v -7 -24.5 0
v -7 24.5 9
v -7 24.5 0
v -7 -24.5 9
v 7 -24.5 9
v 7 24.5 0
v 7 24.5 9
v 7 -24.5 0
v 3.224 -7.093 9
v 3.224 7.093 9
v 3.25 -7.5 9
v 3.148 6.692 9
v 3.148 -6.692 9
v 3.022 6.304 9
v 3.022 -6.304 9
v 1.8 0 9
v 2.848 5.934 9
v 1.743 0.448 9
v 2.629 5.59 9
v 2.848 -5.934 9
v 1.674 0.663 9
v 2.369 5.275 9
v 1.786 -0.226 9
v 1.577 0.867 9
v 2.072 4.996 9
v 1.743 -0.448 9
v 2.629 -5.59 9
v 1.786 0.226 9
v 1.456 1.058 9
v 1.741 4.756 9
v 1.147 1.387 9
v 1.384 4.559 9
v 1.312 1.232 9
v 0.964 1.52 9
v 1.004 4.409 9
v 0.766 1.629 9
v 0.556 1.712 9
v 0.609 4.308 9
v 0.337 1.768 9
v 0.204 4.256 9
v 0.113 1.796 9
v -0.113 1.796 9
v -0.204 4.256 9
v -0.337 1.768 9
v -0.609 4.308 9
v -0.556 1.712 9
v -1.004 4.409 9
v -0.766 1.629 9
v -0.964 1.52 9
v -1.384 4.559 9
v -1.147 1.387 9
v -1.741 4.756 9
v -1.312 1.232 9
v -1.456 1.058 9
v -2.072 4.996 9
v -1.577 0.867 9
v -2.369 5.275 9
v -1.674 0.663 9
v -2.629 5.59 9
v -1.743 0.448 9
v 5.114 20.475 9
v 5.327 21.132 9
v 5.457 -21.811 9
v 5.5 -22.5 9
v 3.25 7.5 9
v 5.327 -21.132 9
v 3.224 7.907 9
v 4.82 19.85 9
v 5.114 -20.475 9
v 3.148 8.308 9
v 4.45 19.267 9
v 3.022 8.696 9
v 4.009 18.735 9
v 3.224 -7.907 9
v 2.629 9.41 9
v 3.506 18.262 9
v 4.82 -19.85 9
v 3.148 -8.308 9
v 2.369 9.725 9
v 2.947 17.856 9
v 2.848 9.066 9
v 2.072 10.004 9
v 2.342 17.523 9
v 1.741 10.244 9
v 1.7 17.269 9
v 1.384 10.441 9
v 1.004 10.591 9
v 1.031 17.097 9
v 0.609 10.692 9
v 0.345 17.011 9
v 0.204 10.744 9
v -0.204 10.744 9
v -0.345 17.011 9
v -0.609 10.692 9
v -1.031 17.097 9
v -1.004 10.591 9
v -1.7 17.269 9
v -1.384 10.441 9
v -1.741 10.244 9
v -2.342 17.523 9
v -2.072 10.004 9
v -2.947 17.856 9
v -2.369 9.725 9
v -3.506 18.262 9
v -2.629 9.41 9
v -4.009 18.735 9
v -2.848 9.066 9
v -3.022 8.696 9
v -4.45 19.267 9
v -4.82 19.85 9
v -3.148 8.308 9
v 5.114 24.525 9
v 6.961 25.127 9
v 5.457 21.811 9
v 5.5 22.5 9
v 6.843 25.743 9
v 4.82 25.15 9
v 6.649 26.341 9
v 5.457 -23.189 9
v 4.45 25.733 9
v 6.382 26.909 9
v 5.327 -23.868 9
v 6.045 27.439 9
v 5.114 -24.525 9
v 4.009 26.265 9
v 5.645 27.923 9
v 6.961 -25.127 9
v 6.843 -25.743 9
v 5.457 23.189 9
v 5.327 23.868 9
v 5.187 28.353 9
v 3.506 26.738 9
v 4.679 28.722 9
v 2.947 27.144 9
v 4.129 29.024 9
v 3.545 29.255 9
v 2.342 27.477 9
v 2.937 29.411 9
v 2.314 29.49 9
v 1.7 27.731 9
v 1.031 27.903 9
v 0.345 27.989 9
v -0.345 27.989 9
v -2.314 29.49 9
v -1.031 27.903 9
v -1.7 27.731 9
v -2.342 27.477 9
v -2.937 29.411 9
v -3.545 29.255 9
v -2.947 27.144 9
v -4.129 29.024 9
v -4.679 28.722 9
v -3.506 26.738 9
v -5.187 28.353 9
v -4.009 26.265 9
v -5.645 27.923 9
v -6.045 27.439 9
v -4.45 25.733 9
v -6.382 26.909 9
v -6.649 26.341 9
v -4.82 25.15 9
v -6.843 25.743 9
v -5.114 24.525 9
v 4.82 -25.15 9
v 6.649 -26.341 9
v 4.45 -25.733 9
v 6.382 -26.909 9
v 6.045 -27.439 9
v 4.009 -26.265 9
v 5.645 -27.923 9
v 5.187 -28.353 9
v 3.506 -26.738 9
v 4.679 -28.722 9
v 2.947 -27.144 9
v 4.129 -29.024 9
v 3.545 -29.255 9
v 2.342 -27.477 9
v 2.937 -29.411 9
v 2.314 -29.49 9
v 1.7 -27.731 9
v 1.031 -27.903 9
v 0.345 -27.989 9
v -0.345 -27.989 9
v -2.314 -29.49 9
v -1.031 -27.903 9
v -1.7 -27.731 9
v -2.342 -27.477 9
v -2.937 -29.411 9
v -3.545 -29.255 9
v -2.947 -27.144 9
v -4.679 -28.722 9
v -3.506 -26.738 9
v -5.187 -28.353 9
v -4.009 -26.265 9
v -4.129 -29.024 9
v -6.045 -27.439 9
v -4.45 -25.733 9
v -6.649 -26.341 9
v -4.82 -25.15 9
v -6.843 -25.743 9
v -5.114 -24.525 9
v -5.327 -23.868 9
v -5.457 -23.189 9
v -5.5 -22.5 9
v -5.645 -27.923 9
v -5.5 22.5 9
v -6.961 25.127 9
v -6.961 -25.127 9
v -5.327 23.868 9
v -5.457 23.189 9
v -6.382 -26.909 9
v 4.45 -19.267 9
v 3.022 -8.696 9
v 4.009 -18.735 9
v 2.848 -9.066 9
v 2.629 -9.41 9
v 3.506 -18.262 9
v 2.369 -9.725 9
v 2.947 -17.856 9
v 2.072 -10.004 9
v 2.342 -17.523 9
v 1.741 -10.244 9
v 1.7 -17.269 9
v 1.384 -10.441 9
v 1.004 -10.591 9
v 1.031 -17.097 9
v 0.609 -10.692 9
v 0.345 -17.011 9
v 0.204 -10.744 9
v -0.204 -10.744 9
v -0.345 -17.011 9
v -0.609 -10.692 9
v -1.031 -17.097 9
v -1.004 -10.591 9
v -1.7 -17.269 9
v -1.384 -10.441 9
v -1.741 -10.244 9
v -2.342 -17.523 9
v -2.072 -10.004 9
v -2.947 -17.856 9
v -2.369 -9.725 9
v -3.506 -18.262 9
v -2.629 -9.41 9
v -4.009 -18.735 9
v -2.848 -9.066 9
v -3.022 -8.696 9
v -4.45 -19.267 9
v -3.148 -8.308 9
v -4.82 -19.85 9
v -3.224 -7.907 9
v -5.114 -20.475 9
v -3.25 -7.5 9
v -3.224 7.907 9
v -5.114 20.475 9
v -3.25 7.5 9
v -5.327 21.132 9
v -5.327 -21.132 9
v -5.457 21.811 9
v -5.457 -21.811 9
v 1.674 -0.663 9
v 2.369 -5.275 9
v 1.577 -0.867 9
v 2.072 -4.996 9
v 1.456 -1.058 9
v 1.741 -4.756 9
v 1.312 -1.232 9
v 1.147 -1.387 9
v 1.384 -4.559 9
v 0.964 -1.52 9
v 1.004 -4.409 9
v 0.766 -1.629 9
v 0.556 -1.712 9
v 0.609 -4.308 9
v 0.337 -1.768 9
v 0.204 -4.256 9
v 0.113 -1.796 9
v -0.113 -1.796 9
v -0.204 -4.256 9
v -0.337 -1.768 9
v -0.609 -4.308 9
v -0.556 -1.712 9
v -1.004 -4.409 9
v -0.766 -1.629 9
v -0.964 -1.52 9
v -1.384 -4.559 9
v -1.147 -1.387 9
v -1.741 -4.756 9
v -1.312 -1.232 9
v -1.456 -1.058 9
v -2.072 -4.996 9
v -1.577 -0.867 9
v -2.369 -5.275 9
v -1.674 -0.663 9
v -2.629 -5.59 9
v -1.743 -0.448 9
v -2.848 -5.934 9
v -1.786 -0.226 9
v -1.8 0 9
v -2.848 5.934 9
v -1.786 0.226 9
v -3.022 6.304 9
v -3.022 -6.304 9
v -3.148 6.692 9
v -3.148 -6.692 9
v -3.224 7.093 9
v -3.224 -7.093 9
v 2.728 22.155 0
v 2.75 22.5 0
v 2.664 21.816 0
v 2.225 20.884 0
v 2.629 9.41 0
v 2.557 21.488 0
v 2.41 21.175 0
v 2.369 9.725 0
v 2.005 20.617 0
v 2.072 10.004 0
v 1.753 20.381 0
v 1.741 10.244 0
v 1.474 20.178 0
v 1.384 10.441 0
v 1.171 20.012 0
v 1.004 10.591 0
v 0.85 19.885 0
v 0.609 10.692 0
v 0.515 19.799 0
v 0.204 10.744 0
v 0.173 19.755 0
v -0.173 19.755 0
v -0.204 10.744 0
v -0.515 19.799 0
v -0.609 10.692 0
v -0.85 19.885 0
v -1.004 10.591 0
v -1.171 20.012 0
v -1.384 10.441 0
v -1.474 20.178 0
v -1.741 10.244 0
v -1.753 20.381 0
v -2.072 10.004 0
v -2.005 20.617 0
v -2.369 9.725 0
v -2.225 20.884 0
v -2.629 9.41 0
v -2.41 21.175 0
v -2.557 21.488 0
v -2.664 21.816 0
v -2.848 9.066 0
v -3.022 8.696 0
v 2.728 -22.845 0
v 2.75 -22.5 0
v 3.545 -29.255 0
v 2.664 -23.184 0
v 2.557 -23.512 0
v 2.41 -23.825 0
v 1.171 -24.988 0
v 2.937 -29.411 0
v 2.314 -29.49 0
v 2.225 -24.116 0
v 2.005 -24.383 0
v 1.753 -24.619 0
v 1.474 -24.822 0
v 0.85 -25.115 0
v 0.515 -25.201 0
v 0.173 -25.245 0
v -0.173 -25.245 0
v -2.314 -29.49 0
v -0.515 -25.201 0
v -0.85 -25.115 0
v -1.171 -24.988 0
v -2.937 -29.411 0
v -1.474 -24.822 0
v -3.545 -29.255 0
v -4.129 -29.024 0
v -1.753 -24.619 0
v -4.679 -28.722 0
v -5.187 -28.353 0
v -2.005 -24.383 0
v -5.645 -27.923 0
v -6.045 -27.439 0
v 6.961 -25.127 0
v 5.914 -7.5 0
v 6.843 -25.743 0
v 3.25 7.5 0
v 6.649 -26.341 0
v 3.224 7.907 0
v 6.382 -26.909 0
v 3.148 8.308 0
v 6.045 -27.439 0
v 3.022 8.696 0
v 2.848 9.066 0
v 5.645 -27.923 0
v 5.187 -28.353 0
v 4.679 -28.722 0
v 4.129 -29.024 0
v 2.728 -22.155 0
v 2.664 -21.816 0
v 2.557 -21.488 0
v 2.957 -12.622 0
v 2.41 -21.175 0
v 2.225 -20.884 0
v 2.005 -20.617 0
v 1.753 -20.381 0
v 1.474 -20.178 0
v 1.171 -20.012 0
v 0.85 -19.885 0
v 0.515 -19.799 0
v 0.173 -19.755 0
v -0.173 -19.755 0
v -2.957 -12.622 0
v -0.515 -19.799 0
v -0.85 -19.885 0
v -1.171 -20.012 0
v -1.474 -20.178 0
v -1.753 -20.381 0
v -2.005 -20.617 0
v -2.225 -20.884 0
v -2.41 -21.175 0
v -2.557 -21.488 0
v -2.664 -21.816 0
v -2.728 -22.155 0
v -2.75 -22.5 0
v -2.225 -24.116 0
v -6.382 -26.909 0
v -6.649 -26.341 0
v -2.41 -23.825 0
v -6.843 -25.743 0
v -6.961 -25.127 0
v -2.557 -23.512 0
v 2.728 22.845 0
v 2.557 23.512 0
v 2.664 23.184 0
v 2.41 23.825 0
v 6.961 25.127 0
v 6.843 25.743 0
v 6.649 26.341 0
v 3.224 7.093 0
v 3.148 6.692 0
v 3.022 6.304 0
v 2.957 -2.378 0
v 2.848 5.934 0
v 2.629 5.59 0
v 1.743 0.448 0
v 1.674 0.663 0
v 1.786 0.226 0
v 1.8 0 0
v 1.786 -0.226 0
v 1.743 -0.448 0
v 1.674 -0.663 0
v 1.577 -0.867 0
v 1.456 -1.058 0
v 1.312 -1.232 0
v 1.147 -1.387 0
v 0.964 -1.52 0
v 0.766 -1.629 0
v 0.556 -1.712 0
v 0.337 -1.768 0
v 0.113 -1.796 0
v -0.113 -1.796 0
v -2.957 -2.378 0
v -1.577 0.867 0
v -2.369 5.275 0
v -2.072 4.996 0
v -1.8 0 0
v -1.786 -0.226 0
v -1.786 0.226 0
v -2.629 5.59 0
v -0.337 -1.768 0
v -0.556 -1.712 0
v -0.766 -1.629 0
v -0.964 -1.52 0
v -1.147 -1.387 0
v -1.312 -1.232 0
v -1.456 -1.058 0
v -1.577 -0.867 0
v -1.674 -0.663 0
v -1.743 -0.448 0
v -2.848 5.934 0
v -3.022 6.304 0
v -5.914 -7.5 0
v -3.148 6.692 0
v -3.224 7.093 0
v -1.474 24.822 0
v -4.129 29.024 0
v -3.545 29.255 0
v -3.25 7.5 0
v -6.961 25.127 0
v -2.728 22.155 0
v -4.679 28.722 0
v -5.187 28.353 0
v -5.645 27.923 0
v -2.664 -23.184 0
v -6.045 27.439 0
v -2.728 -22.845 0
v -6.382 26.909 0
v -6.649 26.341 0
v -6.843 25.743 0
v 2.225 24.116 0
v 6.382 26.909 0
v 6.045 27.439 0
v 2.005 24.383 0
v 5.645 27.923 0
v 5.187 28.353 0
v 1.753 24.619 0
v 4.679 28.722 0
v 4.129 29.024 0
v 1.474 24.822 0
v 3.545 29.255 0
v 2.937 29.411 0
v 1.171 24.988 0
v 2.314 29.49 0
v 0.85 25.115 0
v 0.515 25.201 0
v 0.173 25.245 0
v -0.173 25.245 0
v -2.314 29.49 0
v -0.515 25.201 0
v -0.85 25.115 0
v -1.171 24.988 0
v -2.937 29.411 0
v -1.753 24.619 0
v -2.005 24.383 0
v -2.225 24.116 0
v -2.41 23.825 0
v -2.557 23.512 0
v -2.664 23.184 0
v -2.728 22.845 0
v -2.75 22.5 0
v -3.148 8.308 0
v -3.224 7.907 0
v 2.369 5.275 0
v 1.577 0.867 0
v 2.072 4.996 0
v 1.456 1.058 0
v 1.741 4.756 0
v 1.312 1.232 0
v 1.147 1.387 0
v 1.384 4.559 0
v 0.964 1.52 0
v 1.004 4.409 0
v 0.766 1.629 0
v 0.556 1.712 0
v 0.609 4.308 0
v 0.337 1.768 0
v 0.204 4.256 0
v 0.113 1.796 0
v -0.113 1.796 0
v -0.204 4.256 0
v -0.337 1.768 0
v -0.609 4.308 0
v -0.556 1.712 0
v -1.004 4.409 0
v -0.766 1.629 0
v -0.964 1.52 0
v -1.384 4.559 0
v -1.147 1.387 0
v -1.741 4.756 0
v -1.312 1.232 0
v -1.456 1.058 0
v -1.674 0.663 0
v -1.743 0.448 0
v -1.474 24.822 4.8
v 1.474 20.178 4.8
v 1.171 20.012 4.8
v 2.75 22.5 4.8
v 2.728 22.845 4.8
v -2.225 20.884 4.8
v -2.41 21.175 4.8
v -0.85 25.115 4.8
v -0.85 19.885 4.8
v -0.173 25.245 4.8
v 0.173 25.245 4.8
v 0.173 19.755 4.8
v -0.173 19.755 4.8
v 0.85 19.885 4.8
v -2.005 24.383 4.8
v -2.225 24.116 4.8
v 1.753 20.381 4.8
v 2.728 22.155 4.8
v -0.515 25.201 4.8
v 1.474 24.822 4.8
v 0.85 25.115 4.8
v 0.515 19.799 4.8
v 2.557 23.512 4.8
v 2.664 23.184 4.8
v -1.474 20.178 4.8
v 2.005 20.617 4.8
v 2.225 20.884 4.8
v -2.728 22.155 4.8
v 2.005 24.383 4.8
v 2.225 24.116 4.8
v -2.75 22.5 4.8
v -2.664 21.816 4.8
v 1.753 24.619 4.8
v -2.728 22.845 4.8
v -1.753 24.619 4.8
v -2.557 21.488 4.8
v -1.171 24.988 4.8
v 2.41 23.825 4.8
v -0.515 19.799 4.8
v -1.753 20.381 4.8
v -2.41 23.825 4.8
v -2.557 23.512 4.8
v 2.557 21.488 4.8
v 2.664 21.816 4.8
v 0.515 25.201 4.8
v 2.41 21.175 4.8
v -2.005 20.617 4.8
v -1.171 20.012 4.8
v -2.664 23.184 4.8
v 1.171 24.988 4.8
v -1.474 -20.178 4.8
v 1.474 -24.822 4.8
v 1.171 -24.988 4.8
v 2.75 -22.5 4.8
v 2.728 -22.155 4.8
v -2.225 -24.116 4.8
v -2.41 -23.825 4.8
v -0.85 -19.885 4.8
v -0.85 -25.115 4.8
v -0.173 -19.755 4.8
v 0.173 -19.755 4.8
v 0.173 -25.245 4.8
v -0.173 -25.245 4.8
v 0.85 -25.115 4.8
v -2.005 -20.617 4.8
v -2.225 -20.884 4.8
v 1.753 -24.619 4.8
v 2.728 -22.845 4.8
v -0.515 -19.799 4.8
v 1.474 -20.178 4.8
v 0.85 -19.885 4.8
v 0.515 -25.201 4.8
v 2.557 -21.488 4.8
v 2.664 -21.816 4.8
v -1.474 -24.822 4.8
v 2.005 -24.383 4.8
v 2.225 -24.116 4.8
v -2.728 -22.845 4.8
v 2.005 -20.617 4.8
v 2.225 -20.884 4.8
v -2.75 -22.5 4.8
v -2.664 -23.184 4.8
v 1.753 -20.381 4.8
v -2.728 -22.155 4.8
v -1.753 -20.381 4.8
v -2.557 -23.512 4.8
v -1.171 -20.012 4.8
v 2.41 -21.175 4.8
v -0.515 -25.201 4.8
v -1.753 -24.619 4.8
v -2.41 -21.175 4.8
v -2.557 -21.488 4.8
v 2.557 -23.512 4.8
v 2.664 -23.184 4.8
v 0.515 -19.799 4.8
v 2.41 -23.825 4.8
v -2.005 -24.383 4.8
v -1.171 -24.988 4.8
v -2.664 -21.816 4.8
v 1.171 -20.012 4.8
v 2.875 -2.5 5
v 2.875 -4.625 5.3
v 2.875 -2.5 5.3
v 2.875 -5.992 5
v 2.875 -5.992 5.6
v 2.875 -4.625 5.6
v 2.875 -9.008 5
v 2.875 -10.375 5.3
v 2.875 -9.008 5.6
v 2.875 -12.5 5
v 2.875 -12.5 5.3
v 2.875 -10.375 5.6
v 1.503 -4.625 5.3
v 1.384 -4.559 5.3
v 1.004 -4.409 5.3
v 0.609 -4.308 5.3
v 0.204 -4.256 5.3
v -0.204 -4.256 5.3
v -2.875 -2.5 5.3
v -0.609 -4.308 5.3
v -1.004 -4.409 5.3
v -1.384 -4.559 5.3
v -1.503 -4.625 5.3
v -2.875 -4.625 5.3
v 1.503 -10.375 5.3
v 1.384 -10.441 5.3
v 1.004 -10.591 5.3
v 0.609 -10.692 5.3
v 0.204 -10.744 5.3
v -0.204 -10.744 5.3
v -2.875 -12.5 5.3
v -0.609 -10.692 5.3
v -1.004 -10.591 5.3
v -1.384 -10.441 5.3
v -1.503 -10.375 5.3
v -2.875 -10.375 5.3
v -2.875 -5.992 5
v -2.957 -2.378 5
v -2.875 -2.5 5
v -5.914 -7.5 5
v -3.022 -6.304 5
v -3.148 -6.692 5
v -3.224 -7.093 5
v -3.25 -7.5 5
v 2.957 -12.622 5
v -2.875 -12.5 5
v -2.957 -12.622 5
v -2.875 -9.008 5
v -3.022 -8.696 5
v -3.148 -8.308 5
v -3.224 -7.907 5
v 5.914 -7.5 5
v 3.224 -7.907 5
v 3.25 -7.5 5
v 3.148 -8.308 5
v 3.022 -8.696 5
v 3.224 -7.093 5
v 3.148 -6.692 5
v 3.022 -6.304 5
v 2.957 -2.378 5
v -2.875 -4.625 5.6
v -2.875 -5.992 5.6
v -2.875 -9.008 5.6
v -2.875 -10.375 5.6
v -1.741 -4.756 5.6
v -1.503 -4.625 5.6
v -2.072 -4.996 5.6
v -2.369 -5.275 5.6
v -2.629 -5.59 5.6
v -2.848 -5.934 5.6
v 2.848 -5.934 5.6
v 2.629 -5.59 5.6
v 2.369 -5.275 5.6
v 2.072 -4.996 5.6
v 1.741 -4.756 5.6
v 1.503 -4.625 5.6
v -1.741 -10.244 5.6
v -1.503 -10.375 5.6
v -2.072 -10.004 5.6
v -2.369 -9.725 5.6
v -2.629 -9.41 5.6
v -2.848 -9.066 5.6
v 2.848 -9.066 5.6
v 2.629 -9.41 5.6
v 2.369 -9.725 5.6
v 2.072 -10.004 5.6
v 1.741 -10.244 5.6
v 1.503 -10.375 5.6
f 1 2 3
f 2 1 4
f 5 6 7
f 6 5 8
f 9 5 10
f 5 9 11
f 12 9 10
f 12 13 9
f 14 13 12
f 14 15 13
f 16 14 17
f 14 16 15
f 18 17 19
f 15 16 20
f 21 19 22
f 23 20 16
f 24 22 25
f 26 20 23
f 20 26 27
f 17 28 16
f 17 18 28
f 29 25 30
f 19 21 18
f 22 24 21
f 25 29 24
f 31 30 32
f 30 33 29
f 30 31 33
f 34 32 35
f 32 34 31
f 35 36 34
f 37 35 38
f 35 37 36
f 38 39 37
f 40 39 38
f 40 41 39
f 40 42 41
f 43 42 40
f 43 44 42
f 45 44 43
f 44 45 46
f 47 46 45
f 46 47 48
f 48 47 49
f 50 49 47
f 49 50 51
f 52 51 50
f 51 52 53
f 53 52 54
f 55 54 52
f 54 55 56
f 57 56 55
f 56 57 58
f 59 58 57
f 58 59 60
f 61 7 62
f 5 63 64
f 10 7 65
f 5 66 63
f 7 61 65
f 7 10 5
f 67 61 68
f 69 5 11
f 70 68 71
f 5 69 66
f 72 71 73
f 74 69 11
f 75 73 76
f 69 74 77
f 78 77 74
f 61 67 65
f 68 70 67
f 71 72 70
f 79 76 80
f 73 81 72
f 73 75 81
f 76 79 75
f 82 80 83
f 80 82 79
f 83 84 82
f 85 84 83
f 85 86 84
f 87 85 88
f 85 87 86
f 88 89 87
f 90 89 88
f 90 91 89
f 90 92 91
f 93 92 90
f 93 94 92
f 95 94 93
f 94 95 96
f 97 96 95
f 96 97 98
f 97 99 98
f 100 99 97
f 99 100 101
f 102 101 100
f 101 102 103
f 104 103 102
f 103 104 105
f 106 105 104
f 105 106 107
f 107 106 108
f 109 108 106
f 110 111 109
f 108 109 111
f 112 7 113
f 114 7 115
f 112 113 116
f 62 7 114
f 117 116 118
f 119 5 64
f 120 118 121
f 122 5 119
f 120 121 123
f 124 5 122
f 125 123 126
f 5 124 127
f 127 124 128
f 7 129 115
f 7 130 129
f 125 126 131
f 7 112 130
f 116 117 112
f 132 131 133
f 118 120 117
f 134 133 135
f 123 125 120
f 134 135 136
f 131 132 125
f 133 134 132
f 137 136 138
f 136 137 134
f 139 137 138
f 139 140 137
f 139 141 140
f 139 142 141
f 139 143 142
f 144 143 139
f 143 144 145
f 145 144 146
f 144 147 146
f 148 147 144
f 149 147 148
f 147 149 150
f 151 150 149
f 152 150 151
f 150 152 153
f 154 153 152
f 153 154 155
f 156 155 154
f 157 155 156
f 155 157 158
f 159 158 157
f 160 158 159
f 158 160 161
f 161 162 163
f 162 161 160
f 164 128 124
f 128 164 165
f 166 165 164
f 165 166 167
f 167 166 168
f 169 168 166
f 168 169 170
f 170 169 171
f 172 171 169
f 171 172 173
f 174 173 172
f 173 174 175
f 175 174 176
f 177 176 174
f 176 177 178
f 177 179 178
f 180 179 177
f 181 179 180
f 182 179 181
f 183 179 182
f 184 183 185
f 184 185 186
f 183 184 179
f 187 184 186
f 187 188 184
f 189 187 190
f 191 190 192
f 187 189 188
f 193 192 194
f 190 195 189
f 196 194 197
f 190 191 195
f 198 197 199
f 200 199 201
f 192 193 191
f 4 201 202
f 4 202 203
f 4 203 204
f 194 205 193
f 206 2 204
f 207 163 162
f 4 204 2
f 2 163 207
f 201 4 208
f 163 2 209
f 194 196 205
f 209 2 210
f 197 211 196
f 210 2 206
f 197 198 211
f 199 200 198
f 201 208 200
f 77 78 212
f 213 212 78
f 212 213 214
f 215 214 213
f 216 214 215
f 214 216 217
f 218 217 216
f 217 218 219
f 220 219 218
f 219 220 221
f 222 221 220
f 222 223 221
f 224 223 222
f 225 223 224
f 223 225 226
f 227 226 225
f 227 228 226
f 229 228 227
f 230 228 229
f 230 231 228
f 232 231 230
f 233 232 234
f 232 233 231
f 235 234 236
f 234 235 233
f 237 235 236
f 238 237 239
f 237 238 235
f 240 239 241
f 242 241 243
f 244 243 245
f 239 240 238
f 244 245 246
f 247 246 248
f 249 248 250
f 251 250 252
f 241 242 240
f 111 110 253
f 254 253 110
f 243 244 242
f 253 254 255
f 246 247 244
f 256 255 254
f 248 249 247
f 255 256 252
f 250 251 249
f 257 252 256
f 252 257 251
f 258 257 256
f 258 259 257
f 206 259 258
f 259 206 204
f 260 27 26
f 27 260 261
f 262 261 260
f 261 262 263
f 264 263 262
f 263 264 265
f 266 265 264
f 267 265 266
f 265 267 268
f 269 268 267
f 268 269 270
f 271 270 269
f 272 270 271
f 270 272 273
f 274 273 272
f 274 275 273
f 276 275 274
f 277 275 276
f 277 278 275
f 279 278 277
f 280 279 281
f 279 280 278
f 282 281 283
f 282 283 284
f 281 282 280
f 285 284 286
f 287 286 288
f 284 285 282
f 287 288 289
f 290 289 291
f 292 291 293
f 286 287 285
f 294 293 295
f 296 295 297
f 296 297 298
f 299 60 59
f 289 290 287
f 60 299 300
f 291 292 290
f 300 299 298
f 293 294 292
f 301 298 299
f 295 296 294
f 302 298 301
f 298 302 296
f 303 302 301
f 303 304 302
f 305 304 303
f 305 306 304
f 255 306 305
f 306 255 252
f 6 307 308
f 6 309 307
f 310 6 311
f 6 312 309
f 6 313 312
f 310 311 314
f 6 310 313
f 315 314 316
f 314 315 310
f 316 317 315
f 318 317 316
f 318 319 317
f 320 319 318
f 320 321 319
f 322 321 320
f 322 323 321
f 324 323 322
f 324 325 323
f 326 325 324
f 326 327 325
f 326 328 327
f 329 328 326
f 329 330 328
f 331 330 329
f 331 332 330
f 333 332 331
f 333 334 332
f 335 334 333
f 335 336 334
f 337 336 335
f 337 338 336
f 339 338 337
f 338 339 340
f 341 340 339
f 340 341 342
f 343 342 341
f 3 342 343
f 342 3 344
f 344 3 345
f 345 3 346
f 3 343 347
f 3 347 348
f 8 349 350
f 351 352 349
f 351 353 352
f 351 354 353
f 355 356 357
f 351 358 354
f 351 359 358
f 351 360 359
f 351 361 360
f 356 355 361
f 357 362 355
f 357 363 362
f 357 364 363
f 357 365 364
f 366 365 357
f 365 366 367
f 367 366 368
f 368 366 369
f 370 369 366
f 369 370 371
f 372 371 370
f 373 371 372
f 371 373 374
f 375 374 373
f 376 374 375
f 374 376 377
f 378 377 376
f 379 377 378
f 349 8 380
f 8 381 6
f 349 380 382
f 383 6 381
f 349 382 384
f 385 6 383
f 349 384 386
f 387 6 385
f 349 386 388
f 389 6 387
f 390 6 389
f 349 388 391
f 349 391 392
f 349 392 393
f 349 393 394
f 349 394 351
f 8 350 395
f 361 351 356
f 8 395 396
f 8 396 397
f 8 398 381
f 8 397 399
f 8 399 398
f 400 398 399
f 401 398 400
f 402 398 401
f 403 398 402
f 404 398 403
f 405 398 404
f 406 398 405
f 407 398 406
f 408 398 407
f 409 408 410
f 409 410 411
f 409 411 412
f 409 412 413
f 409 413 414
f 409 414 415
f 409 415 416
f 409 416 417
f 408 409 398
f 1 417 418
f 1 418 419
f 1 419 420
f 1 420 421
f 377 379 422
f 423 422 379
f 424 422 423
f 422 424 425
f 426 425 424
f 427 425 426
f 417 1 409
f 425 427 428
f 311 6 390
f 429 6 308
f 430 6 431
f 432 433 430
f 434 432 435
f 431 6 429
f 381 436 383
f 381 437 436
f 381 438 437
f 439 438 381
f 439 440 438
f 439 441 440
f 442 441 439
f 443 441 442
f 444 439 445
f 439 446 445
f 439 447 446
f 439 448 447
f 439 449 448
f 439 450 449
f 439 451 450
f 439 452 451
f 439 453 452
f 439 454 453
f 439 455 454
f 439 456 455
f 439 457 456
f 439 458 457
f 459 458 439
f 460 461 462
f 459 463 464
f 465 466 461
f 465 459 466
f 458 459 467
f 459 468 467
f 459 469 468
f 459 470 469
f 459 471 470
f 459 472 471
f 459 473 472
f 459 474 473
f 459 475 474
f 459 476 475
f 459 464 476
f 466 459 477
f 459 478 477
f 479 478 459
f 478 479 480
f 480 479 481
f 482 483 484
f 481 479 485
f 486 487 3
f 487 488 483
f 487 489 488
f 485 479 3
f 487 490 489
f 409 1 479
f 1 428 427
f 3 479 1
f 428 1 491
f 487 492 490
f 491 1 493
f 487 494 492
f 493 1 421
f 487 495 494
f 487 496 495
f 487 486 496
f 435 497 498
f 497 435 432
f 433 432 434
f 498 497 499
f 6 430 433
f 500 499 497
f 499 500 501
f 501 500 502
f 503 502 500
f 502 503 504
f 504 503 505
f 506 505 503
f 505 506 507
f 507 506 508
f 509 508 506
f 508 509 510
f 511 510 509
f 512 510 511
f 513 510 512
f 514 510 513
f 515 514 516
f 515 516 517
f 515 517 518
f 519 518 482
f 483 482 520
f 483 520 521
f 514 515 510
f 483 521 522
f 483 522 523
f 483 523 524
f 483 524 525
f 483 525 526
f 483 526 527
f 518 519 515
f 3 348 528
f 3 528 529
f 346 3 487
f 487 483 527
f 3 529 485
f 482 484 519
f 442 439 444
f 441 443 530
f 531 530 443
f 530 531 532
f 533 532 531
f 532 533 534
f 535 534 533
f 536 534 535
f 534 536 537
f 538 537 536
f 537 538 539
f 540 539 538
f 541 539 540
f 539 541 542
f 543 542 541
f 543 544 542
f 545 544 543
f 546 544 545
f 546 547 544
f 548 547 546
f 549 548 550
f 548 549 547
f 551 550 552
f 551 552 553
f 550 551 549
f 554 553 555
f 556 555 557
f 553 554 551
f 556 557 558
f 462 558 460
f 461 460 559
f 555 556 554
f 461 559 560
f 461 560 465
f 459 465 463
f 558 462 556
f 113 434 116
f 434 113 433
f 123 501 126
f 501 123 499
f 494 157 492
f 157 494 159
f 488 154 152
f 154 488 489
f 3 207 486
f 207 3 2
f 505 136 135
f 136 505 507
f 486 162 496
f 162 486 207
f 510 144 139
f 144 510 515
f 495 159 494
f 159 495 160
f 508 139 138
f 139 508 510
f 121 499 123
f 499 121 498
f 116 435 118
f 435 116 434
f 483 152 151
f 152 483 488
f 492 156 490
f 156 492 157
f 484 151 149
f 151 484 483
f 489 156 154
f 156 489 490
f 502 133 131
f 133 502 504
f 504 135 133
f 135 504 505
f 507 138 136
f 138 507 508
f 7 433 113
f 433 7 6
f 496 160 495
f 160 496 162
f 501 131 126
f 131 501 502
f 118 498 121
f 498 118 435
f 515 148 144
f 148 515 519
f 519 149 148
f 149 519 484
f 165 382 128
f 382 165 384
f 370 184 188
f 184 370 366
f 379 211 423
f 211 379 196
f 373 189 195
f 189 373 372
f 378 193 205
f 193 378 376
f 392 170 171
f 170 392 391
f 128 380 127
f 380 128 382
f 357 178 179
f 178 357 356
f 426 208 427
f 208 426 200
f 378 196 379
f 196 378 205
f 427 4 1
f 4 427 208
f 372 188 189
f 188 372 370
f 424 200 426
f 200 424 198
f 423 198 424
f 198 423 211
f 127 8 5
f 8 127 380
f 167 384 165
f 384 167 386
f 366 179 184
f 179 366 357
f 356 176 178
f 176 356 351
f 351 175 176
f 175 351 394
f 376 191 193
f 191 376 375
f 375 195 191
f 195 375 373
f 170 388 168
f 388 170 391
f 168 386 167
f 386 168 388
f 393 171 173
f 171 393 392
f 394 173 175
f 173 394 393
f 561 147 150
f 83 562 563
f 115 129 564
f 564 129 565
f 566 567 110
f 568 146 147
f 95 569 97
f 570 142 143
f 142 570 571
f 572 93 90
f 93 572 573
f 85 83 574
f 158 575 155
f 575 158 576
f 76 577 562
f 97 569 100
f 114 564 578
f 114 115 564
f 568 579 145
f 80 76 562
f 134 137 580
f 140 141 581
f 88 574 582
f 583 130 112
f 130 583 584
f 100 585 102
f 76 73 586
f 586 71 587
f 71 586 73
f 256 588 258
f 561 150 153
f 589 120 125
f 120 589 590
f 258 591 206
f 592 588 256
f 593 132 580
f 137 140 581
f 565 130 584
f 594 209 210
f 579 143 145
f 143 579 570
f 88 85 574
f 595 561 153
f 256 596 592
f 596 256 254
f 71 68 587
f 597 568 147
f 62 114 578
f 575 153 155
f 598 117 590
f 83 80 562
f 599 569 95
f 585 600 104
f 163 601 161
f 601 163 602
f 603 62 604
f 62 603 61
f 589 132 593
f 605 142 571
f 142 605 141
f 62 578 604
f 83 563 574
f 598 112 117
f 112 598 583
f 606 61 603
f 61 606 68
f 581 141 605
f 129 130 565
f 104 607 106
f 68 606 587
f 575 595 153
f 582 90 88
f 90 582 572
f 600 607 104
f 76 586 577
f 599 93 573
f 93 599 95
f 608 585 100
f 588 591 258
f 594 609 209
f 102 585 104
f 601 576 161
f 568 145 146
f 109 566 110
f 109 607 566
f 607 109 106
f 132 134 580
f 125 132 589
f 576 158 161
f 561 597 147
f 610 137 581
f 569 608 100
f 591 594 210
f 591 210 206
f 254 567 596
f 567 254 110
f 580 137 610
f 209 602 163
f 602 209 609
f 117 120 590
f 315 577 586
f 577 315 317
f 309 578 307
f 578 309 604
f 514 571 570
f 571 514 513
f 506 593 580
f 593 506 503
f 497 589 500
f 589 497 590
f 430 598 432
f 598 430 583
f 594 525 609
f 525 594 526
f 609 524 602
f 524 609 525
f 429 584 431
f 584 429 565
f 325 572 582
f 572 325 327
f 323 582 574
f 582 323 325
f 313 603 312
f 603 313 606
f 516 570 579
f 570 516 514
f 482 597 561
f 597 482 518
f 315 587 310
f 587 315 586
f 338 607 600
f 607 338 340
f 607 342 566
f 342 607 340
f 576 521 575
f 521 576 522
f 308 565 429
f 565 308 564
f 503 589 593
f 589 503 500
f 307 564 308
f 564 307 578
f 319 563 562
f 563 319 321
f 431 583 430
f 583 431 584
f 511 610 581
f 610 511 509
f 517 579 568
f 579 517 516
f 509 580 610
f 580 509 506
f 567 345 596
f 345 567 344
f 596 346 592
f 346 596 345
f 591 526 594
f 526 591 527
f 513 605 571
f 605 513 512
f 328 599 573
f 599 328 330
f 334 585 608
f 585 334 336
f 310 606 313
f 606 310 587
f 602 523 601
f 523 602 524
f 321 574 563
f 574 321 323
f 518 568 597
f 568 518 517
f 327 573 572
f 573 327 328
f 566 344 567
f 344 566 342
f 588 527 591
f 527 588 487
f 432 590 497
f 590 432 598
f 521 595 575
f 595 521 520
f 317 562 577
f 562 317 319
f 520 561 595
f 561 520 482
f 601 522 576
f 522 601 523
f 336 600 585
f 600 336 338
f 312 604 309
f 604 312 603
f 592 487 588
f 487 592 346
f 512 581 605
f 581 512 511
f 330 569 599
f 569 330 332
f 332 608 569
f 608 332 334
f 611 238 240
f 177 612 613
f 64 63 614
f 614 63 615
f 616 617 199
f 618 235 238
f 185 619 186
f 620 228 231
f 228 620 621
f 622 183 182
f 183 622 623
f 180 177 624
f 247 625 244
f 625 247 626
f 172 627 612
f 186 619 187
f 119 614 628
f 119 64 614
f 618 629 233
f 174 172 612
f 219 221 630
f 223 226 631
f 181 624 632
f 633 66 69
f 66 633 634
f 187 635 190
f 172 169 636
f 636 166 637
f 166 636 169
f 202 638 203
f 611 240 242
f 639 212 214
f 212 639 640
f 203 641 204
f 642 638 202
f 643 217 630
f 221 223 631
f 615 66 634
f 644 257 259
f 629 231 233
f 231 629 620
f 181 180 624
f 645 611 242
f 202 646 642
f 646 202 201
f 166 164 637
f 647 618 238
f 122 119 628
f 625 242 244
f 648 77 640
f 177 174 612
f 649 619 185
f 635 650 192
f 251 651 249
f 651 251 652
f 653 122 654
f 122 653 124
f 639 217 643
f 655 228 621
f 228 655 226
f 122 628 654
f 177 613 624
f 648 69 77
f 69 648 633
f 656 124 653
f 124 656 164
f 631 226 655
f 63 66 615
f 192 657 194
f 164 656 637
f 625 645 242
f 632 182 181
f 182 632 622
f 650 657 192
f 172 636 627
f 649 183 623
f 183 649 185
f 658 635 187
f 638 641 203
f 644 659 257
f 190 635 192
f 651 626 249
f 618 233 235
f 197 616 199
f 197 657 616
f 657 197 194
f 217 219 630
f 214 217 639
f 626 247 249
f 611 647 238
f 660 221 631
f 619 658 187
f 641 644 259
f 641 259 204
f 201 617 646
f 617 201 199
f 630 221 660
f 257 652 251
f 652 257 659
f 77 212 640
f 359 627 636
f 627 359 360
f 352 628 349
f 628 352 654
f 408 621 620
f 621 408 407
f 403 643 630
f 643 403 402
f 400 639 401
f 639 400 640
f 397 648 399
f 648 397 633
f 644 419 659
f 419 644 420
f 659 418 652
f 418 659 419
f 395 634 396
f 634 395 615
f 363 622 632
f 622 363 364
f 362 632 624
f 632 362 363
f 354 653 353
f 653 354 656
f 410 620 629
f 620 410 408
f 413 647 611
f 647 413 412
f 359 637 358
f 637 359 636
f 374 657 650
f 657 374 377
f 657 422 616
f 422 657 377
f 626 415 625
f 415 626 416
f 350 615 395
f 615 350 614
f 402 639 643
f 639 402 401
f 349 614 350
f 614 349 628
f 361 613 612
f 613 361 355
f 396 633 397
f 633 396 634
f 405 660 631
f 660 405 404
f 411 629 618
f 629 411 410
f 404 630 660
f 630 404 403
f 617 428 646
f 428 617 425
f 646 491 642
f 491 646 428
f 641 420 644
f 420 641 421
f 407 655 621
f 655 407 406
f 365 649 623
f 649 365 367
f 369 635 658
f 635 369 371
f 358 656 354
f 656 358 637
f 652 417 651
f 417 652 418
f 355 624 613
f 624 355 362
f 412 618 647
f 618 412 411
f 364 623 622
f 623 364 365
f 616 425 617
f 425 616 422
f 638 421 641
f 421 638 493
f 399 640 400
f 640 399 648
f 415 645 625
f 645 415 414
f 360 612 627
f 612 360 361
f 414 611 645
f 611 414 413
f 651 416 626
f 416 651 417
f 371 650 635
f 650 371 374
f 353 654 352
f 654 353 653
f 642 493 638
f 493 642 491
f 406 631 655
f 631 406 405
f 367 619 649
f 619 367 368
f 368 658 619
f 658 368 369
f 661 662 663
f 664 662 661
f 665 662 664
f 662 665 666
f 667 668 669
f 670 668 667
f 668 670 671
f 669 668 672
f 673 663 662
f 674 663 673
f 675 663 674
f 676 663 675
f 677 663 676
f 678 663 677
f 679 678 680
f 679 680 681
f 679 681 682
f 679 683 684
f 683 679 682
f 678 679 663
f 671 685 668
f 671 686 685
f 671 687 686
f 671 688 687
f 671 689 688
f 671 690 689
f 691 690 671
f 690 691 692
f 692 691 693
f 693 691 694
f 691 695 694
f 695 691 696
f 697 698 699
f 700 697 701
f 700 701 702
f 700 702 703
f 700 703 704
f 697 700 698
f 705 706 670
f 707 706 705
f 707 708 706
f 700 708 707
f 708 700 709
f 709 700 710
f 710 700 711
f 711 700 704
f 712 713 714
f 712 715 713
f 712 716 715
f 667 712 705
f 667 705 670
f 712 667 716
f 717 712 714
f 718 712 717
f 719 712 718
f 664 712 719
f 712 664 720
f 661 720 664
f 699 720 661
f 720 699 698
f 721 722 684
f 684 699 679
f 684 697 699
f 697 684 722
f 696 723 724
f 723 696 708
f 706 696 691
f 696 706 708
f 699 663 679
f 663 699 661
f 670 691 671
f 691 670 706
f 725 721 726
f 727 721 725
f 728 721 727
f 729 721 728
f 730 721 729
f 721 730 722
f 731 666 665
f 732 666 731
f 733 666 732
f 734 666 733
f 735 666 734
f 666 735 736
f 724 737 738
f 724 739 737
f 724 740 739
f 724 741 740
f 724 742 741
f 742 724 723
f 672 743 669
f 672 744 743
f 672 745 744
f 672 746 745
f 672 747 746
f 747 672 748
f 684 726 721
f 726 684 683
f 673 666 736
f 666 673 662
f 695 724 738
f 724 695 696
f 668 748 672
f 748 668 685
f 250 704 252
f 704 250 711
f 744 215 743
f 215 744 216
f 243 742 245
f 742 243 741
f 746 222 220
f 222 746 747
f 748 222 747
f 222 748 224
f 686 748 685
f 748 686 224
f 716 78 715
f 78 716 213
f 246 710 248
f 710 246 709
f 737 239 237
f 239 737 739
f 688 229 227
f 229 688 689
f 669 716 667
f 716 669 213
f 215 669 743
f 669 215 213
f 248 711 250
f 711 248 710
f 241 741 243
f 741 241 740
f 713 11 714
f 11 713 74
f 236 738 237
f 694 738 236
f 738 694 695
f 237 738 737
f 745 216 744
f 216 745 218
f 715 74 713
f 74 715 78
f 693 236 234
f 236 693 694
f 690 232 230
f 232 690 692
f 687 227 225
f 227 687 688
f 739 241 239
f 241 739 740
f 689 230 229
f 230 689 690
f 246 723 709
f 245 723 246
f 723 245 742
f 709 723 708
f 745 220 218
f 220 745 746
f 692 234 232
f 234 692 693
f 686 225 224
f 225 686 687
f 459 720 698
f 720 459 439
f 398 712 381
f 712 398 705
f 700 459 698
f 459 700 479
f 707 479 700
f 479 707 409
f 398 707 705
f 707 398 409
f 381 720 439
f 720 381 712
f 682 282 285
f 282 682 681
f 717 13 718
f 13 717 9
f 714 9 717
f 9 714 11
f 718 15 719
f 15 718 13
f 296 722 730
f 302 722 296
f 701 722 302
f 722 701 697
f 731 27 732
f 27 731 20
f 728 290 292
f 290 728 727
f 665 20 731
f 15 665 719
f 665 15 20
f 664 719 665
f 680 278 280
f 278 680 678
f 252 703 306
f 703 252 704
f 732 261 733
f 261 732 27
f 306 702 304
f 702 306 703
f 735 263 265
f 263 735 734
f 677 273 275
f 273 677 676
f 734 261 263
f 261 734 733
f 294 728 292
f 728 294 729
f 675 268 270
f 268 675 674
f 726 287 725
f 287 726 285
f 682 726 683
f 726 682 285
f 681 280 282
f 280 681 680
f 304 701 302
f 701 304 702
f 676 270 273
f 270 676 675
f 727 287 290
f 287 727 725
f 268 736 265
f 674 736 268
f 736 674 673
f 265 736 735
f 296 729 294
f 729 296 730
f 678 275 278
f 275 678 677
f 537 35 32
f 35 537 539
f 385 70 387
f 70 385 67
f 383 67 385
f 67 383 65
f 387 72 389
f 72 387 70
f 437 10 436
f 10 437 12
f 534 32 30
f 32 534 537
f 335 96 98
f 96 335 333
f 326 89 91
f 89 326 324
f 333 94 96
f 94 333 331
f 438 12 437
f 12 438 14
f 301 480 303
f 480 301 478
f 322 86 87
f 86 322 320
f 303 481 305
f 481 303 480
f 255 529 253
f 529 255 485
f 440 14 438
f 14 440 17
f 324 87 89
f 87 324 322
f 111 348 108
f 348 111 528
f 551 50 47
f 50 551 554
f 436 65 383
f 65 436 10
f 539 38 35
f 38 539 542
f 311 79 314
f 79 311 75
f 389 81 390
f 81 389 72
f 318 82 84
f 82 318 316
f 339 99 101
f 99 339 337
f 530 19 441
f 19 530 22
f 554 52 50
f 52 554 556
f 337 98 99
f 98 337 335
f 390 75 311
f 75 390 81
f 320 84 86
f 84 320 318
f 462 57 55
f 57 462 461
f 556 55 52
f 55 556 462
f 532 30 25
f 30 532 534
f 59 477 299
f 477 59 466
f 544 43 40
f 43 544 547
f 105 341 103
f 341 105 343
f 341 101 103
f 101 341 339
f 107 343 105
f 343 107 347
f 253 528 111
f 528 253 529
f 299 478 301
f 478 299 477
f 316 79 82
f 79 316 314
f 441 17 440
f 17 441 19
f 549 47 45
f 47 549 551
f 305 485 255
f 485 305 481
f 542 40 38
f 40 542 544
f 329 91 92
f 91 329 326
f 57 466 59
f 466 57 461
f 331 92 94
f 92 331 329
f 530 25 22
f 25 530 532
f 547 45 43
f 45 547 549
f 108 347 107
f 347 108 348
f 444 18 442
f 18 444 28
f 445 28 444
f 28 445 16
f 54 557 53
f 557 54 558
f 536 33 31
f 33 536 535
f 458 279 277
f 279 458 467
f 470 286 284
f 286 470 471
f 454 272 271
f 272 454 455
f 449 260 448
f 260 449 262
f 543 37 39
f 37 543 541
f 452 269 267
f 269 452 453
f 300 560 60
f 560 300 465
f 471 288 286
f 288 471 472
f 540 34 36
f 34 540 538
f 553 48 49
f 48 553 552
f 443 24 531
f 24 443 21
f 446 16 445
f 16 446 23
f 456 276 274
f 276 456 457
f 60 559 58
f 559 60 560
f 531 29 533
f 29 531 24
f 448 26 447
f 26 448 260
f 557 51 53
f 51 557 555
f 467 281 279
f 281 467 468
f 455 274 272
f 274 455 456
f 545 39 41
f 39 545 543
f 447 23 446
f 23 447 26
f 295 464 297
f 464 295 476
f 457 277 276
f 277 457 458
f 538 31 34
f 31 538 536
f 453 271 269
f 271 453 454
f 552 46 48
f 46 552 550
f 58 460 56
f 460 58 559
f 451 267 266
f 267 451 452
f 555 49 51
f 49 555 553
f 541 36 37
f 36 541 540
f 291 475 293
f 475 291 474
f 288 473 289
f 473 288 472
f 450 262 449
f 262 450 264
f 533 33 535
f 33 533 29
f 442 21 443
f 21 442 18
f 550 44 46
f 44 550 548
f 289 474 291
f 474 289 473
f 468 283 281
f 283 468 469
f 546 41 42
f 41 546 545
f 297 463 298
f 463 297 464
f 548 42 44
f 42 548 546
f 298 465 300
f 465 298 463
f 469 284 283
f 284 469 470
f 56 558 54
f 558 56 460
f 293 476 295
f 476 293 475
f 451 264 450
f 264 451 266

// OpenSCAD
$fn = 50;


difference() {
	union() {
		hull() {
			translate(v = [-2.0000000000, 9.5000000000, 0]) {
				cylinder(h = 9, r = 5);
			}
			translate(v = [2.0000000000, 9.5000000000, 0]) {
				cylinder(h = 9, r = 5);
			}
			translate(v = [-2.0000000000, -9.5000000000, 0]) {
				cylinder(h = 9, r = 5);
			}
			translate(v = [2.0000000000, -9.5000000000, 0]) {
				cylinder(h = 9, r = 5);
			}
		}
		translate(v = [0.0000000000, 15.0000000000, 0]) {
			hull() {
				translate(v = [-2.0000000000, 9.5000000000, 0]) {
					cylinder(h = 9, r = 5);
				}
				translate(v = [2.0000000000, 9.5000000000, 0]) {
					cylinder(h = 9, r = 5);
				}
				translate(v = [-2.0000000000, -9.5000000000, 0]) {
					cylinder(h = 9, r = 5);
				}
				translate(v = [2.0000000000, -9.5000000000, 0]) {
					cylinder(h = 9, r = 5);
				}
			}
		}
		translate(v = [0.0000000000, 15.0000000000, 0]) {
			hull() {
				translate(v = [-2.0000000000, 9.5000000000, 0]) {
					cylinder(h = 9, r = 5);
				}
				translate(v = [2.0000000000, 9.5000000000, 0]) {
					cylinder(h = 9, r = 5);
				}
				translate(v = [-2.0000000000, -9.5000000000, 0]) {
					cylinder(h = 9, r = 5);
				}
				translate(v = [2.0000000000, -9.5000000000, 0]) {
					cylinder(h = 9, r = 5);
				}
			}
		}
		translate(v = [0.0000000000, -15.0000000000, 0]) {
			hull() {
				translate(v = [-2.0000000000, 9.5000000000, 0]) {
					cylinder(h = 9, r = 5);
				}
				translate(v = [2.0000000000, 9.5000000000, 0]) {
					cylinder(h = 9, r = 5);
				}
				translate(v = [-2.0000000000, -9.5000000000, 0]) {
					cylinder(h = 9, r = 5);
				}
				translate(v = [2.0000000000, -9.5000000000, 0]) {
					cylinder(h = 9, r = 5);
				}
			}
		}
		translate(v = [0.0000000000, -15.0000000000, 0]) {
			hull() {
				translate(v = [-2.0000000000, 9.5000000000, 0]) {
					cylinder(h = 9, r = 5);
				}
				translate(v = [2.0000000000, 9.5000000000, 0]) {
					cylinder(h = 9, r = 5);
				}
				translate(v = [-2.0000000000, -9.5000000000, 0]) {
					cylinder(h = 9, r = 5);
				}
				translate(v = [2.0000000000, -9.5000000000, 0]) {
					cylinder(h = 9, r = 5);
				}
			}
		}
	}
	union() {
		translate(v = [0.0000000000, 22.5000000000, 9]) {
			rotate(a = [0, 0, 0]) {
				difference() {
					union() {
						#translate(v = [0, 0, -9.0000000000]) {
							cylinder(h = 9, r = 2.2500000000);
						}
						#translate(v = [0, 0, -4.2000000000]) {
							cylinder(h = 4.2000000000, r1 = 2.7500000000, r2 = 5.5000000000);
						}
						#translate(v = [0, 0, -9.0000000000]) {
							cylinder(h = 9, r = 2.7500000000);
						}
						#translate(v = [0, 0, -9.0000000000]) {
							cylinder(h = 9, r = 2.2500000000);
						}
					}
					union();
				}
			}
		}
		translate(v = [0.0000000000, 22.5000000000, 9]) {
			rotate(a = [0, 0, 0]) {
				difference() {
					union() {
						#translate(v = [0, 0, -9.0000000000]) {
							cylinder(h = 9, r = 2.2500000000);
						}
						#translate(v = [0, 0, -4.2000000000]) {
							cylinder(h = 4.2000000000, r1 = 2.7500000000, r2 = 5.5000000000);
						}
						#translate(v = [0, 0, -9.0000000000]) {
							cylinder(h = 9, r = 2.7500000000);
						}
						#translate(v = [0, 0, -9.0000000000]) {
							cylinder(h = 9, r = 2.2500000000);
						}
					}
					union();
				}
			}
		}
		translate(v = [0.0000000000, -22.5000000000, 9]) {
			rotate(a = [0, 0, 0]) {
				difference() {
					union() {
						#translate(v = [0, 0, -9.0000000000]) {
							cylinder(h = 9, r = 2.2500000000);
						}
						#translate(v = [0, 0, -4.2000000000]) {
							cylinder(h = 4.2000000000, r1 = 2.7500000000, r2 = 5.5000000000);
						}
						#translate(v = [0, 0, -9.0000000000]) {
							cylinder(h = 9, r = 2.7500000000);
						}
						#translate(v = [0, 0, -9.0000000000]) {
							cylinder(h = 9, r = 2.2500000000);
						}
					}
					union();
				}
			}
		}
		translate(v = [0.0000000000, -22.5000000000, 9]) {
			rotate(a = [0, 0, 0]) {
				difference() {
					union() {
						#translate(v = [0, 0, -9.0000000000]) {
							cylinder(h = 9, r = 2.2500000000);
						}
						#translate(v = [0, 0, -4.2000000000]) {
							cylinder(h = 4.2000000000, r1 = 2.7500000000, r2 = 5.5000000000);
						}
						#translate(v = [0, 0, -9.0000000000]) {
							cylinder(h = 9, r = 2.7500000000);
						}
						#translate(v = [0, 0, -9.0000000000]) {
							cylinder(h = 9, r = 2.2500000000);
						}
					}
					union();
				}
			}
		}
		translate(v = [0.0000000000, -7.5000000000, 0]) {
			rotate(a = [0, 0, 0]) {
				difference() {
					union() {
						#translate(v = [-2.8750000000, -5.0000000000, -0.3000000000]) {
							cube(size = [5.7500000000, 10, 0.3000000000]);
						}
						#translate(v = [-2.8750000000, -2.8750000000, -0.6000000000]) {
							cube(size = [5.7500000000, 5.7500000000, 0.3000000000]);
						}
						#translate(v = [-2.8750000000, -5.0000000000, 5]) {
							cube(size = [5.7500000000, 10, 0.3000000000]);
						}
						#translate(v = [-2.8750000000, -2.8750000000, 5.3000000000]) {
							cube(size = [5.7500000000, 5.7500000000, 0.3000000000]);
						}
						#translate(v = [0, 0, -100.0000000000]) {
							cylinder(h = 200, r = 3.2500000000);
						}
						#linear_extrude(height = 5) {
							polygon(points = [[5.9142500000, 0.0000000000], [2.9571250000, 5.1218907443], [-2.9571250000, 5.1218907443], [-5.9142500000, 0.0000000000], [-2.9571250000, -5.1218907443], [2.9571250000, -5.1218907443]]);
						}
						#translate(v = [-2.8750000000, -5.0000000000, -0.3000000000]) {
							cube(size = [5.7500000000, 10, 0.3000000000]);
						}
						#translate(v = [-2.8750000000, -2.8750000000, -0.6000000000]) {
							cube(size = [5.7500000000, 5.7500000000, 0.3000000000]);
						}
						#translate(v = [-2.8750000000, -5.0000000000, 5]) {
							cube(size = [5.7500000000, 10, 0.3000000000]);
						}
						#translate(v = [-2.8750000000, -2.8750000000, 5.3000000000]) {
							cube(size = [5.7500000000, 5.7500000000, 0.3000000000]);
						}
						#translate(v = [0, 0, -100.0000000000]) {
							cylinder(h = 200, r = 3.2500000000);
						}
						#translate(v = [-2.8750000000, -5.0000000000, -0.3000000000]) {
							cube(size = [5.7500000000, 10, 0.3000000000]);
						}
						#translate(v = [-2.8750000000, -2.8750000000, -0.6000000000]) {
							cube(size = [5.7500000000, 5.7500000000, 0.3000000000]);
						}
						#translate(v = [-2.8750000000, -5.0000000000, 5]) {
							cube(size = [5.7500000000, 10, 0.3000000000]);
						}
						#translate(v = [-2.8750000000, -2.8750000000, 5.3000000000]) {
							cube(size = [5.7500000000, 5.7500000000, 0.3000000000]);
						}
						#translate(v = [0, 0, -100.0000000000]) {
							cylinder(h = 200, r = 3.2500000000);
						}
					}
					union();
				}
			}
		}
		translate(v = [0.0000000000, -7.5000000000, 0]) {
			translate(v = [0, 0, -100]) {
				cylinder(h = 200, r = 3.2500000000);
			}
		}
		translate(v = [0.0000000000, 7.5000000000, 0]) {
			translate(v = [0, 0, -100]) {
				cylinder(h = 200, r = 3.2500000000);
			}
		}
		translate(v = [0.0000000000, -7.5000000000, 0]) {
			translate(v = [0, 0, -100]) {
				cylinder(h = 200, r = 1.8000000000);
			}
		}
		translate(v = [0, 0, -100]) {
			cylinder(h = 200, r = 1.8000000000);
		}
		translate(v = [0.0000000000, 7.5000000000, 0]) {
			translate(v = [0, 0, -100]) {
				cylinder(h = 200, r = 1.8000000000);
			}
		}
	}
}
